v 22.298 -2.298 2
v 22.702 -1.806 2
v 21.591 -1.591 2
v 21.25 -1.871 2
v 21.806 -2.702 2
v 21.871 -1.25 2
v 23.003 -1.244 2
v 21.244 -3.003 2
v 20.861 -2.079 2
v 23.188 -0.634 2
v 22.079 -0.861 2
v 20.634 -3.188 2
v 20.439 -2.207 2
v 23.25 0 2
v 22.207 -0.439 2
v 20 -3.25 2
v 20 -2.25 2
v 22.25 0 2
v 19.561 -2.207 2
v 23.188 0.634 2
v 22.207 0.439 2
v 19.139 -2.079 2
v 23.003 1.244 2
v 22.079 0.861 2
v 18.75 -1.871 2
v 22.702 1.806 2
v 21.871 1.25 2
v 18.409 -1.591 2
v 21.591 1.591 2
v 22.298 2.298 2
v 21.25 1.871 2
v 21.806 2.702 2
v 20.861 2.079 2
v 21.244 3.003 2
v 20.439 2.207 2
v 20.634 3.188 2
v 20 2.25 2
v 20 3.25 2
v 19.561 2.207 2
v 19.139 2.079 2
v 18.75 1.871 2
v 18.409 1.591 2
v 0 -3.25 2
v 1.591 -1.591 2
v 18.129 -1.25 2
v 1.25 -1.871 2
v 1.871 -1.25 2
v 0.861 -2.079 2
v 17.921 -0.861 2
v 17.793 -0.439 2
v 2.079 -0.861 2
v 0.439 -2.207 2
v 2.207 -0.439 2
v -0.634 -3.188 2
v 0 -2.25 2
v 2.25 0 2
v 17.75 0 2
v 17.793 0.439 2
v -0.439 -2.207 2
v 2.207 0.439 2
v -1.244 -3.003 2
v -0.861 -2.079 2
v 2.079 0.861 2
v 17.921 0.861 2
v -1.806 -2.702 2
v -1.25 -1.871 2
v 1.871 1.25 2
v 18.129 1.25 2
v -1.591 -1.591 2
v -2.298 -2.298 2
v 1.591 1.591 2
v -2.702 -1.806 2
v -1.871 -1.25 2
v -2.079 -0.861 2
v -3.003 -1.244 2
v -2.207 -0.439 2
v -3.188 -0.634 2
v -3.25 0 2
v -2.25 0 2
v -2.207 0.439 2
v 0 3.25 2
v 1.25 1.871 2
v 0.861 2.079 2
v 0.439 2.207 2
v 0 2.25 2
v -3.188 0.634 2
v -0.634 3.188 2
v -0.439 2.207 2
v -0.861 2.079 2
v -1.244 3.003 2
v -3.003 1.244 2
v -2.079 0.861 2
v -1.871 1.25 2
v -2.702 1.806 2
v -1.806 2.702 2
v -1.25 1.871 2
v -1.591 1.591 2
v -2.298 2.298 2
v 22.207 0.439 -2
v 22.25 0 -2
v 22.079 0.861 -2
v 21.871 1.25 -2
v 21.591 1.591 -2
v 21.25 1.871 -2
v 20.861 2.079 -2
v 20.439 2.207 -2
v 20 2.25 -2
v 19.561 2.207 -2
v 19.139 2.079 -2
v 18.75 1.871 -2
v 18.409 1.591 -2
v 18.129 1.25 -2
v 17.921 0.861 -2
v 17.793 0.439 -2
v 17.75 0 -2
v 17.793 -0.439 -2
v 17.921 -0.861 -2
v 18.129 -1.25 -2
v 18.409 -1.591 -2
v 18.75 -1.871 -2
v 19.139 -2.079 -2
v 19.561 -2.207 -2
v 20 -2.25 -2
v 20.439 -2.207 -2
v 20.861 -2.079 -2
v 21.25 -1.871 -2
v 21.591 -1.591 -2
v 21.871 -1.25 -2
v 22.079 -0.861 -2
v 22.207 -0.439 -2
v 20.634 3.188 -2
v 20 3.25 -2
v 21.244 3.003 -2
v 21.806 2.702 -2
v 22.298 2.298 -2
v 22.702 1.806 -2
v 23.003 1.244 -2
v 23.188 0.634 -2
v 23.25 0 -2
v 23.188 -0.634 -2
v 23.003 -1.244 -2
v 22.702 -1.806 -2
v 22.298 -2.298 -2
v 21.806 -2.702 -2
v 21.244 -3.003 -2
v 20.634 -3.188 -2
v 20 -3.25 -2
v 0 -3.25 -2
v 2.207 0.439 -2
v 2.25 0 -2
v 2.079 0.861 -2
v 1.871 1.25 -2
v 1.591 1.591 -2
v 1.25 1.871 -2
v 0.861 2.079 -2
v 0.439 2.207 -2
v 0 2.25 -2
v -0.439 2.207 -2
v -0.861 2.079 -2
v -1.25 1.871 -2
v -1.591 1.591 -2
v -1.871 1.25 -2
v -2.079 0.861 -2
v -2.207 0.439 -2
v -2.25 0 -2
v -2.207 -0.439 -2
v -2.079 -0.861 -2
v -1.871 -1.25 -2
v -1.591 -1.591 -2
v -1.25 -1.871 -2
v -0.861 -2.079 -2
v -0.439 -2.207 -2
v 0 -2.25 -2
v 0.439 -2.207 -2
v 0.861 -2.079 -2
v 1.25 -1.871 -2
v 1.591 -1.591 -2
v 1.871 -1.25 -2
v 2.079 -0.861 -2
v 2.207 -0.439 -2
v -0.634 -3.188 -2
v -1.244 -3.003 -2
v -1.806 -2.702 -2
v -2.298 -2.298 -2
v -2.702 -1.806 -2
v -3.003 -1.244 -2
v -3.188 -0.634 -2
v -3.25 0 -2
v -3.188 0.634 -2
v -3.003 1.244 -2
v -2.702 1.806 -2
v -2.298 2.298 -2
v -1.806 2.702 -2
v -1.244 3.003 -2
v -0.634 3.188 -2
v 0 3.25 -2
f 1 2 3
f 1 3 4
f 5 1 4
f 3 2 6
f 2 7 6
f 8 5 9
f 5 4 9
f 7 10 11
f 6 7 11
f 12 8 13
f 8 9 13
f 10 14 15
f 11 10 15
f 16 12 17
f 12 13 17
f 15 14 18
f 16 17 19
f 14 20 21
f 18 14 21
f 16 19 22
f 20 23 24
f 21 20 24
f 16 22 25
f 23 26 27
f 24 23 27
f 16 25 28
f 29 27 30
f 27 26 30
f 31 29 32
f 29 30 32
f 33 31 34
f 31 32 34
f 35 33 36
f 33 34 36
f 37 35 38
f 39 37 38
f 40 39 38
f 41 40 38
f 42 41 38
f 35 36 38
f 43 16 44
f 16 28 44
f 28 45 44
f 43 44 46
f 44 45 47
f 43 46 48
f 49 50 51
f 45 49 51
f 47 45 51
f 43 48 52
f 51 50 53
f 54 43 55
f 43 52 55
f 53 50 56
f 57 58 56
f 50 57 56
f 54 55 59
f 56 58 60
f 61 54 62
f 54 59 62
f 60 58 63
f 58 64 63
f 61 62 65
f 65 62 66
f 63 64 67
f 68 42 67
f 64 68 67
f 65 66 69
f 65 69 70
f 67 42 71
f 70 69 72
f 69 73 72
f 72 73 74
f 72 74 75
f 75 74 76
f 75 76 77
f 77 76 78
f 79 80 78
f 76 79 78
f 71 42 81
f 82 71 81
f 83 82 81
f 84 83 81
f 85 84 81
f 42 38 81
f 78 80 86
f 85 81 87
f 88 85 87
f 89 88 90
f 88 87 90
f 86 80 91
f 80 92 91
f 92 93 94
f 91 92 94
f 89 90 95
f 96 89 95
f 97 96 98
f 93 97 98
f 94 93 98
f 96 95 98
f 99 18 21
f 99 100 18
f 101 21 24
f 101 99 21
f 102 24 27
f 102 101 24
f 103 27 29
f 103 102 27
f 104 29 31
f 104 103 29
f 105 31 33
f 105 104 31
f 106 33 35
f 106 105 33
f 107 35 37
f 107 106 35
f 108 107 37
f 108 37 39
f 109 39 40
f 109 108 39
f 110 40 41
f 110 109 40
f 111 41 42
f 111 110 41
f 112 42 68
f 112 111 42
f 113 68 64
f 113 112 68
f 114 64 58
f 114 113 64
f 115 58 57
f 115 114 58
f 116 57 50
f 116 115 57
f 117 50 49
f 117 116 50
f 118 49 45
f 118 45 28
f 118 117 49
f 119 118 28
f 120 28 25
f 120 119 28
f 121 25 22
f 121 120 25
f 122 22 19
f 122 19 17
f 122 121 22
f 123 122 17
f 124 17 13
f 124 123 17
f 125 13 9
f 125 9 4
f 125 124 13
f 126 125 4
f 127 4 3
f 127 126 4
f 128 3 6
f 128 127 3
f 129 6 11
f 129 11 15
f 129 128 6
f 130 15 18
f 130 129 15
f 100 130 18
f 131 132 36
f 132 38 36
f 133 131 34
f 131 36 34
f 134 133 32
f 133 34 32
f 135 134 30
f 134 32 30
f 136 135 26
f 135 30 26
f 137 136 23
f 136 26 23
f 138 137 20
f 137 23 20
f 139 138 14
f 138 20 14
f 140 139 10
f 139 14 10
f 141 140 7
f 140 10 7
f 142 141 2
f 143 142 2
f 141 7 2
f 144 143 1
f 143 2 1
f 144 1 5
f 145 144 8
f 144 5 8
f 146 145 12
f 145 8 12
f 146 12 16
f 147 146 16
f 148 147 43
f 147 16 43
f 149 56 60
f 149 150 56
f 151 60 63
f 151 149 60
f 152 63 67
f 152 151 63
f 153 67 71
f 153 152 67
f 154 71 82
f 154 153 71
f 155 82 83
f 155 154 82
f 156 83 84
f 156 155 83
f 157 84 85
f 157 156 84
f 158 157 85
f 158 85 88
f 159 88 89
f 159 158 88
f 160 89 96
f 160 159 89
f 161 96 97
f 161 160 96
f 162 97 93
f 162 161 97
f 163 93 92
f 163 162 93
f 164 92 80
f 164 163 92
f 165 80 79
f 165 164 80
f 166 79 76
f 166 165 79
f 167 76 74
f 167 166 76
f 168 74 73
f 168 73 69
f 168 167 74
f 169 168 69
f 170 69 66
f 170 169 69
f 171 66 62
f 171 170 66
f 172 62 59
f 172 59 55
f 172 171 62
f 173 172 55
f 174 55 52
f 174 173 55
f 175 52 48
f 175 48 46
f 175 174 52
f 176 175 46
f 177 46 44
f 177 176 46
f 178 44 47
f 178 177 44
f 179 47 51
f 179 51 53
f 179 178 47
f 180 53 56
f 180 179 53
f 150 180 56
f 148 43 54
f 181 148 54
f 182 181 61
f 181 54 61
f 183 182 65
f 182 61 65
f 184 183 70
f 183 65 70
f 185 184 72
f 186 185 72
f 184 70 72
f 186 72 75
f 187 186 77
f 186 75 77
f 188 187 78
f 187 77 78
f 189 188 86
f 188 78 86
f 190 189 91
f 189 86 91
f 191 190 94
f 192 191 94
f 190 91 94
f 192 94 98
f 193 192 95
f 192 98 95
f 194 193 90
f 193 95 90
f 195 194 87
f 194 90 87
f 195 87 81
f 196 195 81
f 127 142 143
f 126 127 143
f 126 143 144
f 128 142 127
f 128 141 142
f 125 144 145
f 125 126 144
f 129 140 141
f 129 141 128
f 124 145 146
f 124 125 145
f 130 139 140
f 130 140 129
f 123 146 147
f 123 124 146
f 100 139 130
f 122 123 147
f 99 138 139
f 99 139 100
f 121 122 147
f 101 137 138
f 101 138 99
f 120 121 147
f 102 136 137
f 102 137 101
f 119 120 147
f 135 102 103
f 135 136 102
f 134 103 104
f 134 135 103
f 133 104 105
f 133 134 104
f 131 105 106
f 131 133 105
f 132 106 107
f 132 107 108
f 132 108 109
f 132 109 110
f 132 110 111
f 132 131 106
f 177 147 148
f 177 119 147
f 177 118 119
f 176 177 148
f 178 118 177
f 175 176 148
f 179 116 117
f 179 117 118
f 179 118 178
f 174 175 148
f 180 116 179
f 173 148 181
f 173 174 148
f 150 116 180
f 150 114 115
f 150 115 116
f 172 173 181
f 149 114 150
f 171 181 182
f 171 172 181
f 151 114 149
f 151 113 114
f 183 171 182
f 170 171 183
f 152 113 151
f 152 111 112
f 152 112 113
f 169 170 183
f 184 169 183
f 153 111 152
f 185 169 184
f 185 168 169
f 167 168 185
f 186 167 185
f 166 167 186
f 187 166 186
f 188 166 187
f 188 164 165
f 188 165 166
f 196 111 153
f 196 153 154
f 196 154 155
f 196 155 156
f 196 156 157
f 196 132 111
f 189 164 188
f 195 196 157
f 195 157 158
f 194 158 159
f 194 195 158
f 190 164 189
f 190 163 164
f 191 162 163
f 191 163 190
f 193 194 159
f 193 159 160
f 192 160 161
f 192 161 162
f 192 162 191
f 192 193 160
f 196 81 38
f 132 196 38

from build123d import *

# Parameters (mm, degrees)
SKETCH1_R           = 2.25
BOSS_EXTRUDE1_DEPTH = 2


with BuildPart() as part:
    # Sketch1 → Boss-Extrude1 (new, symmetric)
    with BuildSketch(Plane.XY):
        with BuildLine():
            Line((0, 3.25), (20, 3.25))
            ThreePointArc((20, 3.25), (23.25, 0), (20, -3.25))
            Line((20, -3.25), (0, -3.25))
            ThreePointArc((0, -3.25), (-3.25, 0), (0, 3.25))
        make_face()
        Circle(SKETCH1_R, mode=Mode.SUBTRACT)
        with Locations((20, 0)):
            Circle(SKETCH1_R, mode=Mode.SUBTRACT)
    extrude(amount=BOSS_EXTRUDE1_DEPTH, both=True)


solid = part.part
